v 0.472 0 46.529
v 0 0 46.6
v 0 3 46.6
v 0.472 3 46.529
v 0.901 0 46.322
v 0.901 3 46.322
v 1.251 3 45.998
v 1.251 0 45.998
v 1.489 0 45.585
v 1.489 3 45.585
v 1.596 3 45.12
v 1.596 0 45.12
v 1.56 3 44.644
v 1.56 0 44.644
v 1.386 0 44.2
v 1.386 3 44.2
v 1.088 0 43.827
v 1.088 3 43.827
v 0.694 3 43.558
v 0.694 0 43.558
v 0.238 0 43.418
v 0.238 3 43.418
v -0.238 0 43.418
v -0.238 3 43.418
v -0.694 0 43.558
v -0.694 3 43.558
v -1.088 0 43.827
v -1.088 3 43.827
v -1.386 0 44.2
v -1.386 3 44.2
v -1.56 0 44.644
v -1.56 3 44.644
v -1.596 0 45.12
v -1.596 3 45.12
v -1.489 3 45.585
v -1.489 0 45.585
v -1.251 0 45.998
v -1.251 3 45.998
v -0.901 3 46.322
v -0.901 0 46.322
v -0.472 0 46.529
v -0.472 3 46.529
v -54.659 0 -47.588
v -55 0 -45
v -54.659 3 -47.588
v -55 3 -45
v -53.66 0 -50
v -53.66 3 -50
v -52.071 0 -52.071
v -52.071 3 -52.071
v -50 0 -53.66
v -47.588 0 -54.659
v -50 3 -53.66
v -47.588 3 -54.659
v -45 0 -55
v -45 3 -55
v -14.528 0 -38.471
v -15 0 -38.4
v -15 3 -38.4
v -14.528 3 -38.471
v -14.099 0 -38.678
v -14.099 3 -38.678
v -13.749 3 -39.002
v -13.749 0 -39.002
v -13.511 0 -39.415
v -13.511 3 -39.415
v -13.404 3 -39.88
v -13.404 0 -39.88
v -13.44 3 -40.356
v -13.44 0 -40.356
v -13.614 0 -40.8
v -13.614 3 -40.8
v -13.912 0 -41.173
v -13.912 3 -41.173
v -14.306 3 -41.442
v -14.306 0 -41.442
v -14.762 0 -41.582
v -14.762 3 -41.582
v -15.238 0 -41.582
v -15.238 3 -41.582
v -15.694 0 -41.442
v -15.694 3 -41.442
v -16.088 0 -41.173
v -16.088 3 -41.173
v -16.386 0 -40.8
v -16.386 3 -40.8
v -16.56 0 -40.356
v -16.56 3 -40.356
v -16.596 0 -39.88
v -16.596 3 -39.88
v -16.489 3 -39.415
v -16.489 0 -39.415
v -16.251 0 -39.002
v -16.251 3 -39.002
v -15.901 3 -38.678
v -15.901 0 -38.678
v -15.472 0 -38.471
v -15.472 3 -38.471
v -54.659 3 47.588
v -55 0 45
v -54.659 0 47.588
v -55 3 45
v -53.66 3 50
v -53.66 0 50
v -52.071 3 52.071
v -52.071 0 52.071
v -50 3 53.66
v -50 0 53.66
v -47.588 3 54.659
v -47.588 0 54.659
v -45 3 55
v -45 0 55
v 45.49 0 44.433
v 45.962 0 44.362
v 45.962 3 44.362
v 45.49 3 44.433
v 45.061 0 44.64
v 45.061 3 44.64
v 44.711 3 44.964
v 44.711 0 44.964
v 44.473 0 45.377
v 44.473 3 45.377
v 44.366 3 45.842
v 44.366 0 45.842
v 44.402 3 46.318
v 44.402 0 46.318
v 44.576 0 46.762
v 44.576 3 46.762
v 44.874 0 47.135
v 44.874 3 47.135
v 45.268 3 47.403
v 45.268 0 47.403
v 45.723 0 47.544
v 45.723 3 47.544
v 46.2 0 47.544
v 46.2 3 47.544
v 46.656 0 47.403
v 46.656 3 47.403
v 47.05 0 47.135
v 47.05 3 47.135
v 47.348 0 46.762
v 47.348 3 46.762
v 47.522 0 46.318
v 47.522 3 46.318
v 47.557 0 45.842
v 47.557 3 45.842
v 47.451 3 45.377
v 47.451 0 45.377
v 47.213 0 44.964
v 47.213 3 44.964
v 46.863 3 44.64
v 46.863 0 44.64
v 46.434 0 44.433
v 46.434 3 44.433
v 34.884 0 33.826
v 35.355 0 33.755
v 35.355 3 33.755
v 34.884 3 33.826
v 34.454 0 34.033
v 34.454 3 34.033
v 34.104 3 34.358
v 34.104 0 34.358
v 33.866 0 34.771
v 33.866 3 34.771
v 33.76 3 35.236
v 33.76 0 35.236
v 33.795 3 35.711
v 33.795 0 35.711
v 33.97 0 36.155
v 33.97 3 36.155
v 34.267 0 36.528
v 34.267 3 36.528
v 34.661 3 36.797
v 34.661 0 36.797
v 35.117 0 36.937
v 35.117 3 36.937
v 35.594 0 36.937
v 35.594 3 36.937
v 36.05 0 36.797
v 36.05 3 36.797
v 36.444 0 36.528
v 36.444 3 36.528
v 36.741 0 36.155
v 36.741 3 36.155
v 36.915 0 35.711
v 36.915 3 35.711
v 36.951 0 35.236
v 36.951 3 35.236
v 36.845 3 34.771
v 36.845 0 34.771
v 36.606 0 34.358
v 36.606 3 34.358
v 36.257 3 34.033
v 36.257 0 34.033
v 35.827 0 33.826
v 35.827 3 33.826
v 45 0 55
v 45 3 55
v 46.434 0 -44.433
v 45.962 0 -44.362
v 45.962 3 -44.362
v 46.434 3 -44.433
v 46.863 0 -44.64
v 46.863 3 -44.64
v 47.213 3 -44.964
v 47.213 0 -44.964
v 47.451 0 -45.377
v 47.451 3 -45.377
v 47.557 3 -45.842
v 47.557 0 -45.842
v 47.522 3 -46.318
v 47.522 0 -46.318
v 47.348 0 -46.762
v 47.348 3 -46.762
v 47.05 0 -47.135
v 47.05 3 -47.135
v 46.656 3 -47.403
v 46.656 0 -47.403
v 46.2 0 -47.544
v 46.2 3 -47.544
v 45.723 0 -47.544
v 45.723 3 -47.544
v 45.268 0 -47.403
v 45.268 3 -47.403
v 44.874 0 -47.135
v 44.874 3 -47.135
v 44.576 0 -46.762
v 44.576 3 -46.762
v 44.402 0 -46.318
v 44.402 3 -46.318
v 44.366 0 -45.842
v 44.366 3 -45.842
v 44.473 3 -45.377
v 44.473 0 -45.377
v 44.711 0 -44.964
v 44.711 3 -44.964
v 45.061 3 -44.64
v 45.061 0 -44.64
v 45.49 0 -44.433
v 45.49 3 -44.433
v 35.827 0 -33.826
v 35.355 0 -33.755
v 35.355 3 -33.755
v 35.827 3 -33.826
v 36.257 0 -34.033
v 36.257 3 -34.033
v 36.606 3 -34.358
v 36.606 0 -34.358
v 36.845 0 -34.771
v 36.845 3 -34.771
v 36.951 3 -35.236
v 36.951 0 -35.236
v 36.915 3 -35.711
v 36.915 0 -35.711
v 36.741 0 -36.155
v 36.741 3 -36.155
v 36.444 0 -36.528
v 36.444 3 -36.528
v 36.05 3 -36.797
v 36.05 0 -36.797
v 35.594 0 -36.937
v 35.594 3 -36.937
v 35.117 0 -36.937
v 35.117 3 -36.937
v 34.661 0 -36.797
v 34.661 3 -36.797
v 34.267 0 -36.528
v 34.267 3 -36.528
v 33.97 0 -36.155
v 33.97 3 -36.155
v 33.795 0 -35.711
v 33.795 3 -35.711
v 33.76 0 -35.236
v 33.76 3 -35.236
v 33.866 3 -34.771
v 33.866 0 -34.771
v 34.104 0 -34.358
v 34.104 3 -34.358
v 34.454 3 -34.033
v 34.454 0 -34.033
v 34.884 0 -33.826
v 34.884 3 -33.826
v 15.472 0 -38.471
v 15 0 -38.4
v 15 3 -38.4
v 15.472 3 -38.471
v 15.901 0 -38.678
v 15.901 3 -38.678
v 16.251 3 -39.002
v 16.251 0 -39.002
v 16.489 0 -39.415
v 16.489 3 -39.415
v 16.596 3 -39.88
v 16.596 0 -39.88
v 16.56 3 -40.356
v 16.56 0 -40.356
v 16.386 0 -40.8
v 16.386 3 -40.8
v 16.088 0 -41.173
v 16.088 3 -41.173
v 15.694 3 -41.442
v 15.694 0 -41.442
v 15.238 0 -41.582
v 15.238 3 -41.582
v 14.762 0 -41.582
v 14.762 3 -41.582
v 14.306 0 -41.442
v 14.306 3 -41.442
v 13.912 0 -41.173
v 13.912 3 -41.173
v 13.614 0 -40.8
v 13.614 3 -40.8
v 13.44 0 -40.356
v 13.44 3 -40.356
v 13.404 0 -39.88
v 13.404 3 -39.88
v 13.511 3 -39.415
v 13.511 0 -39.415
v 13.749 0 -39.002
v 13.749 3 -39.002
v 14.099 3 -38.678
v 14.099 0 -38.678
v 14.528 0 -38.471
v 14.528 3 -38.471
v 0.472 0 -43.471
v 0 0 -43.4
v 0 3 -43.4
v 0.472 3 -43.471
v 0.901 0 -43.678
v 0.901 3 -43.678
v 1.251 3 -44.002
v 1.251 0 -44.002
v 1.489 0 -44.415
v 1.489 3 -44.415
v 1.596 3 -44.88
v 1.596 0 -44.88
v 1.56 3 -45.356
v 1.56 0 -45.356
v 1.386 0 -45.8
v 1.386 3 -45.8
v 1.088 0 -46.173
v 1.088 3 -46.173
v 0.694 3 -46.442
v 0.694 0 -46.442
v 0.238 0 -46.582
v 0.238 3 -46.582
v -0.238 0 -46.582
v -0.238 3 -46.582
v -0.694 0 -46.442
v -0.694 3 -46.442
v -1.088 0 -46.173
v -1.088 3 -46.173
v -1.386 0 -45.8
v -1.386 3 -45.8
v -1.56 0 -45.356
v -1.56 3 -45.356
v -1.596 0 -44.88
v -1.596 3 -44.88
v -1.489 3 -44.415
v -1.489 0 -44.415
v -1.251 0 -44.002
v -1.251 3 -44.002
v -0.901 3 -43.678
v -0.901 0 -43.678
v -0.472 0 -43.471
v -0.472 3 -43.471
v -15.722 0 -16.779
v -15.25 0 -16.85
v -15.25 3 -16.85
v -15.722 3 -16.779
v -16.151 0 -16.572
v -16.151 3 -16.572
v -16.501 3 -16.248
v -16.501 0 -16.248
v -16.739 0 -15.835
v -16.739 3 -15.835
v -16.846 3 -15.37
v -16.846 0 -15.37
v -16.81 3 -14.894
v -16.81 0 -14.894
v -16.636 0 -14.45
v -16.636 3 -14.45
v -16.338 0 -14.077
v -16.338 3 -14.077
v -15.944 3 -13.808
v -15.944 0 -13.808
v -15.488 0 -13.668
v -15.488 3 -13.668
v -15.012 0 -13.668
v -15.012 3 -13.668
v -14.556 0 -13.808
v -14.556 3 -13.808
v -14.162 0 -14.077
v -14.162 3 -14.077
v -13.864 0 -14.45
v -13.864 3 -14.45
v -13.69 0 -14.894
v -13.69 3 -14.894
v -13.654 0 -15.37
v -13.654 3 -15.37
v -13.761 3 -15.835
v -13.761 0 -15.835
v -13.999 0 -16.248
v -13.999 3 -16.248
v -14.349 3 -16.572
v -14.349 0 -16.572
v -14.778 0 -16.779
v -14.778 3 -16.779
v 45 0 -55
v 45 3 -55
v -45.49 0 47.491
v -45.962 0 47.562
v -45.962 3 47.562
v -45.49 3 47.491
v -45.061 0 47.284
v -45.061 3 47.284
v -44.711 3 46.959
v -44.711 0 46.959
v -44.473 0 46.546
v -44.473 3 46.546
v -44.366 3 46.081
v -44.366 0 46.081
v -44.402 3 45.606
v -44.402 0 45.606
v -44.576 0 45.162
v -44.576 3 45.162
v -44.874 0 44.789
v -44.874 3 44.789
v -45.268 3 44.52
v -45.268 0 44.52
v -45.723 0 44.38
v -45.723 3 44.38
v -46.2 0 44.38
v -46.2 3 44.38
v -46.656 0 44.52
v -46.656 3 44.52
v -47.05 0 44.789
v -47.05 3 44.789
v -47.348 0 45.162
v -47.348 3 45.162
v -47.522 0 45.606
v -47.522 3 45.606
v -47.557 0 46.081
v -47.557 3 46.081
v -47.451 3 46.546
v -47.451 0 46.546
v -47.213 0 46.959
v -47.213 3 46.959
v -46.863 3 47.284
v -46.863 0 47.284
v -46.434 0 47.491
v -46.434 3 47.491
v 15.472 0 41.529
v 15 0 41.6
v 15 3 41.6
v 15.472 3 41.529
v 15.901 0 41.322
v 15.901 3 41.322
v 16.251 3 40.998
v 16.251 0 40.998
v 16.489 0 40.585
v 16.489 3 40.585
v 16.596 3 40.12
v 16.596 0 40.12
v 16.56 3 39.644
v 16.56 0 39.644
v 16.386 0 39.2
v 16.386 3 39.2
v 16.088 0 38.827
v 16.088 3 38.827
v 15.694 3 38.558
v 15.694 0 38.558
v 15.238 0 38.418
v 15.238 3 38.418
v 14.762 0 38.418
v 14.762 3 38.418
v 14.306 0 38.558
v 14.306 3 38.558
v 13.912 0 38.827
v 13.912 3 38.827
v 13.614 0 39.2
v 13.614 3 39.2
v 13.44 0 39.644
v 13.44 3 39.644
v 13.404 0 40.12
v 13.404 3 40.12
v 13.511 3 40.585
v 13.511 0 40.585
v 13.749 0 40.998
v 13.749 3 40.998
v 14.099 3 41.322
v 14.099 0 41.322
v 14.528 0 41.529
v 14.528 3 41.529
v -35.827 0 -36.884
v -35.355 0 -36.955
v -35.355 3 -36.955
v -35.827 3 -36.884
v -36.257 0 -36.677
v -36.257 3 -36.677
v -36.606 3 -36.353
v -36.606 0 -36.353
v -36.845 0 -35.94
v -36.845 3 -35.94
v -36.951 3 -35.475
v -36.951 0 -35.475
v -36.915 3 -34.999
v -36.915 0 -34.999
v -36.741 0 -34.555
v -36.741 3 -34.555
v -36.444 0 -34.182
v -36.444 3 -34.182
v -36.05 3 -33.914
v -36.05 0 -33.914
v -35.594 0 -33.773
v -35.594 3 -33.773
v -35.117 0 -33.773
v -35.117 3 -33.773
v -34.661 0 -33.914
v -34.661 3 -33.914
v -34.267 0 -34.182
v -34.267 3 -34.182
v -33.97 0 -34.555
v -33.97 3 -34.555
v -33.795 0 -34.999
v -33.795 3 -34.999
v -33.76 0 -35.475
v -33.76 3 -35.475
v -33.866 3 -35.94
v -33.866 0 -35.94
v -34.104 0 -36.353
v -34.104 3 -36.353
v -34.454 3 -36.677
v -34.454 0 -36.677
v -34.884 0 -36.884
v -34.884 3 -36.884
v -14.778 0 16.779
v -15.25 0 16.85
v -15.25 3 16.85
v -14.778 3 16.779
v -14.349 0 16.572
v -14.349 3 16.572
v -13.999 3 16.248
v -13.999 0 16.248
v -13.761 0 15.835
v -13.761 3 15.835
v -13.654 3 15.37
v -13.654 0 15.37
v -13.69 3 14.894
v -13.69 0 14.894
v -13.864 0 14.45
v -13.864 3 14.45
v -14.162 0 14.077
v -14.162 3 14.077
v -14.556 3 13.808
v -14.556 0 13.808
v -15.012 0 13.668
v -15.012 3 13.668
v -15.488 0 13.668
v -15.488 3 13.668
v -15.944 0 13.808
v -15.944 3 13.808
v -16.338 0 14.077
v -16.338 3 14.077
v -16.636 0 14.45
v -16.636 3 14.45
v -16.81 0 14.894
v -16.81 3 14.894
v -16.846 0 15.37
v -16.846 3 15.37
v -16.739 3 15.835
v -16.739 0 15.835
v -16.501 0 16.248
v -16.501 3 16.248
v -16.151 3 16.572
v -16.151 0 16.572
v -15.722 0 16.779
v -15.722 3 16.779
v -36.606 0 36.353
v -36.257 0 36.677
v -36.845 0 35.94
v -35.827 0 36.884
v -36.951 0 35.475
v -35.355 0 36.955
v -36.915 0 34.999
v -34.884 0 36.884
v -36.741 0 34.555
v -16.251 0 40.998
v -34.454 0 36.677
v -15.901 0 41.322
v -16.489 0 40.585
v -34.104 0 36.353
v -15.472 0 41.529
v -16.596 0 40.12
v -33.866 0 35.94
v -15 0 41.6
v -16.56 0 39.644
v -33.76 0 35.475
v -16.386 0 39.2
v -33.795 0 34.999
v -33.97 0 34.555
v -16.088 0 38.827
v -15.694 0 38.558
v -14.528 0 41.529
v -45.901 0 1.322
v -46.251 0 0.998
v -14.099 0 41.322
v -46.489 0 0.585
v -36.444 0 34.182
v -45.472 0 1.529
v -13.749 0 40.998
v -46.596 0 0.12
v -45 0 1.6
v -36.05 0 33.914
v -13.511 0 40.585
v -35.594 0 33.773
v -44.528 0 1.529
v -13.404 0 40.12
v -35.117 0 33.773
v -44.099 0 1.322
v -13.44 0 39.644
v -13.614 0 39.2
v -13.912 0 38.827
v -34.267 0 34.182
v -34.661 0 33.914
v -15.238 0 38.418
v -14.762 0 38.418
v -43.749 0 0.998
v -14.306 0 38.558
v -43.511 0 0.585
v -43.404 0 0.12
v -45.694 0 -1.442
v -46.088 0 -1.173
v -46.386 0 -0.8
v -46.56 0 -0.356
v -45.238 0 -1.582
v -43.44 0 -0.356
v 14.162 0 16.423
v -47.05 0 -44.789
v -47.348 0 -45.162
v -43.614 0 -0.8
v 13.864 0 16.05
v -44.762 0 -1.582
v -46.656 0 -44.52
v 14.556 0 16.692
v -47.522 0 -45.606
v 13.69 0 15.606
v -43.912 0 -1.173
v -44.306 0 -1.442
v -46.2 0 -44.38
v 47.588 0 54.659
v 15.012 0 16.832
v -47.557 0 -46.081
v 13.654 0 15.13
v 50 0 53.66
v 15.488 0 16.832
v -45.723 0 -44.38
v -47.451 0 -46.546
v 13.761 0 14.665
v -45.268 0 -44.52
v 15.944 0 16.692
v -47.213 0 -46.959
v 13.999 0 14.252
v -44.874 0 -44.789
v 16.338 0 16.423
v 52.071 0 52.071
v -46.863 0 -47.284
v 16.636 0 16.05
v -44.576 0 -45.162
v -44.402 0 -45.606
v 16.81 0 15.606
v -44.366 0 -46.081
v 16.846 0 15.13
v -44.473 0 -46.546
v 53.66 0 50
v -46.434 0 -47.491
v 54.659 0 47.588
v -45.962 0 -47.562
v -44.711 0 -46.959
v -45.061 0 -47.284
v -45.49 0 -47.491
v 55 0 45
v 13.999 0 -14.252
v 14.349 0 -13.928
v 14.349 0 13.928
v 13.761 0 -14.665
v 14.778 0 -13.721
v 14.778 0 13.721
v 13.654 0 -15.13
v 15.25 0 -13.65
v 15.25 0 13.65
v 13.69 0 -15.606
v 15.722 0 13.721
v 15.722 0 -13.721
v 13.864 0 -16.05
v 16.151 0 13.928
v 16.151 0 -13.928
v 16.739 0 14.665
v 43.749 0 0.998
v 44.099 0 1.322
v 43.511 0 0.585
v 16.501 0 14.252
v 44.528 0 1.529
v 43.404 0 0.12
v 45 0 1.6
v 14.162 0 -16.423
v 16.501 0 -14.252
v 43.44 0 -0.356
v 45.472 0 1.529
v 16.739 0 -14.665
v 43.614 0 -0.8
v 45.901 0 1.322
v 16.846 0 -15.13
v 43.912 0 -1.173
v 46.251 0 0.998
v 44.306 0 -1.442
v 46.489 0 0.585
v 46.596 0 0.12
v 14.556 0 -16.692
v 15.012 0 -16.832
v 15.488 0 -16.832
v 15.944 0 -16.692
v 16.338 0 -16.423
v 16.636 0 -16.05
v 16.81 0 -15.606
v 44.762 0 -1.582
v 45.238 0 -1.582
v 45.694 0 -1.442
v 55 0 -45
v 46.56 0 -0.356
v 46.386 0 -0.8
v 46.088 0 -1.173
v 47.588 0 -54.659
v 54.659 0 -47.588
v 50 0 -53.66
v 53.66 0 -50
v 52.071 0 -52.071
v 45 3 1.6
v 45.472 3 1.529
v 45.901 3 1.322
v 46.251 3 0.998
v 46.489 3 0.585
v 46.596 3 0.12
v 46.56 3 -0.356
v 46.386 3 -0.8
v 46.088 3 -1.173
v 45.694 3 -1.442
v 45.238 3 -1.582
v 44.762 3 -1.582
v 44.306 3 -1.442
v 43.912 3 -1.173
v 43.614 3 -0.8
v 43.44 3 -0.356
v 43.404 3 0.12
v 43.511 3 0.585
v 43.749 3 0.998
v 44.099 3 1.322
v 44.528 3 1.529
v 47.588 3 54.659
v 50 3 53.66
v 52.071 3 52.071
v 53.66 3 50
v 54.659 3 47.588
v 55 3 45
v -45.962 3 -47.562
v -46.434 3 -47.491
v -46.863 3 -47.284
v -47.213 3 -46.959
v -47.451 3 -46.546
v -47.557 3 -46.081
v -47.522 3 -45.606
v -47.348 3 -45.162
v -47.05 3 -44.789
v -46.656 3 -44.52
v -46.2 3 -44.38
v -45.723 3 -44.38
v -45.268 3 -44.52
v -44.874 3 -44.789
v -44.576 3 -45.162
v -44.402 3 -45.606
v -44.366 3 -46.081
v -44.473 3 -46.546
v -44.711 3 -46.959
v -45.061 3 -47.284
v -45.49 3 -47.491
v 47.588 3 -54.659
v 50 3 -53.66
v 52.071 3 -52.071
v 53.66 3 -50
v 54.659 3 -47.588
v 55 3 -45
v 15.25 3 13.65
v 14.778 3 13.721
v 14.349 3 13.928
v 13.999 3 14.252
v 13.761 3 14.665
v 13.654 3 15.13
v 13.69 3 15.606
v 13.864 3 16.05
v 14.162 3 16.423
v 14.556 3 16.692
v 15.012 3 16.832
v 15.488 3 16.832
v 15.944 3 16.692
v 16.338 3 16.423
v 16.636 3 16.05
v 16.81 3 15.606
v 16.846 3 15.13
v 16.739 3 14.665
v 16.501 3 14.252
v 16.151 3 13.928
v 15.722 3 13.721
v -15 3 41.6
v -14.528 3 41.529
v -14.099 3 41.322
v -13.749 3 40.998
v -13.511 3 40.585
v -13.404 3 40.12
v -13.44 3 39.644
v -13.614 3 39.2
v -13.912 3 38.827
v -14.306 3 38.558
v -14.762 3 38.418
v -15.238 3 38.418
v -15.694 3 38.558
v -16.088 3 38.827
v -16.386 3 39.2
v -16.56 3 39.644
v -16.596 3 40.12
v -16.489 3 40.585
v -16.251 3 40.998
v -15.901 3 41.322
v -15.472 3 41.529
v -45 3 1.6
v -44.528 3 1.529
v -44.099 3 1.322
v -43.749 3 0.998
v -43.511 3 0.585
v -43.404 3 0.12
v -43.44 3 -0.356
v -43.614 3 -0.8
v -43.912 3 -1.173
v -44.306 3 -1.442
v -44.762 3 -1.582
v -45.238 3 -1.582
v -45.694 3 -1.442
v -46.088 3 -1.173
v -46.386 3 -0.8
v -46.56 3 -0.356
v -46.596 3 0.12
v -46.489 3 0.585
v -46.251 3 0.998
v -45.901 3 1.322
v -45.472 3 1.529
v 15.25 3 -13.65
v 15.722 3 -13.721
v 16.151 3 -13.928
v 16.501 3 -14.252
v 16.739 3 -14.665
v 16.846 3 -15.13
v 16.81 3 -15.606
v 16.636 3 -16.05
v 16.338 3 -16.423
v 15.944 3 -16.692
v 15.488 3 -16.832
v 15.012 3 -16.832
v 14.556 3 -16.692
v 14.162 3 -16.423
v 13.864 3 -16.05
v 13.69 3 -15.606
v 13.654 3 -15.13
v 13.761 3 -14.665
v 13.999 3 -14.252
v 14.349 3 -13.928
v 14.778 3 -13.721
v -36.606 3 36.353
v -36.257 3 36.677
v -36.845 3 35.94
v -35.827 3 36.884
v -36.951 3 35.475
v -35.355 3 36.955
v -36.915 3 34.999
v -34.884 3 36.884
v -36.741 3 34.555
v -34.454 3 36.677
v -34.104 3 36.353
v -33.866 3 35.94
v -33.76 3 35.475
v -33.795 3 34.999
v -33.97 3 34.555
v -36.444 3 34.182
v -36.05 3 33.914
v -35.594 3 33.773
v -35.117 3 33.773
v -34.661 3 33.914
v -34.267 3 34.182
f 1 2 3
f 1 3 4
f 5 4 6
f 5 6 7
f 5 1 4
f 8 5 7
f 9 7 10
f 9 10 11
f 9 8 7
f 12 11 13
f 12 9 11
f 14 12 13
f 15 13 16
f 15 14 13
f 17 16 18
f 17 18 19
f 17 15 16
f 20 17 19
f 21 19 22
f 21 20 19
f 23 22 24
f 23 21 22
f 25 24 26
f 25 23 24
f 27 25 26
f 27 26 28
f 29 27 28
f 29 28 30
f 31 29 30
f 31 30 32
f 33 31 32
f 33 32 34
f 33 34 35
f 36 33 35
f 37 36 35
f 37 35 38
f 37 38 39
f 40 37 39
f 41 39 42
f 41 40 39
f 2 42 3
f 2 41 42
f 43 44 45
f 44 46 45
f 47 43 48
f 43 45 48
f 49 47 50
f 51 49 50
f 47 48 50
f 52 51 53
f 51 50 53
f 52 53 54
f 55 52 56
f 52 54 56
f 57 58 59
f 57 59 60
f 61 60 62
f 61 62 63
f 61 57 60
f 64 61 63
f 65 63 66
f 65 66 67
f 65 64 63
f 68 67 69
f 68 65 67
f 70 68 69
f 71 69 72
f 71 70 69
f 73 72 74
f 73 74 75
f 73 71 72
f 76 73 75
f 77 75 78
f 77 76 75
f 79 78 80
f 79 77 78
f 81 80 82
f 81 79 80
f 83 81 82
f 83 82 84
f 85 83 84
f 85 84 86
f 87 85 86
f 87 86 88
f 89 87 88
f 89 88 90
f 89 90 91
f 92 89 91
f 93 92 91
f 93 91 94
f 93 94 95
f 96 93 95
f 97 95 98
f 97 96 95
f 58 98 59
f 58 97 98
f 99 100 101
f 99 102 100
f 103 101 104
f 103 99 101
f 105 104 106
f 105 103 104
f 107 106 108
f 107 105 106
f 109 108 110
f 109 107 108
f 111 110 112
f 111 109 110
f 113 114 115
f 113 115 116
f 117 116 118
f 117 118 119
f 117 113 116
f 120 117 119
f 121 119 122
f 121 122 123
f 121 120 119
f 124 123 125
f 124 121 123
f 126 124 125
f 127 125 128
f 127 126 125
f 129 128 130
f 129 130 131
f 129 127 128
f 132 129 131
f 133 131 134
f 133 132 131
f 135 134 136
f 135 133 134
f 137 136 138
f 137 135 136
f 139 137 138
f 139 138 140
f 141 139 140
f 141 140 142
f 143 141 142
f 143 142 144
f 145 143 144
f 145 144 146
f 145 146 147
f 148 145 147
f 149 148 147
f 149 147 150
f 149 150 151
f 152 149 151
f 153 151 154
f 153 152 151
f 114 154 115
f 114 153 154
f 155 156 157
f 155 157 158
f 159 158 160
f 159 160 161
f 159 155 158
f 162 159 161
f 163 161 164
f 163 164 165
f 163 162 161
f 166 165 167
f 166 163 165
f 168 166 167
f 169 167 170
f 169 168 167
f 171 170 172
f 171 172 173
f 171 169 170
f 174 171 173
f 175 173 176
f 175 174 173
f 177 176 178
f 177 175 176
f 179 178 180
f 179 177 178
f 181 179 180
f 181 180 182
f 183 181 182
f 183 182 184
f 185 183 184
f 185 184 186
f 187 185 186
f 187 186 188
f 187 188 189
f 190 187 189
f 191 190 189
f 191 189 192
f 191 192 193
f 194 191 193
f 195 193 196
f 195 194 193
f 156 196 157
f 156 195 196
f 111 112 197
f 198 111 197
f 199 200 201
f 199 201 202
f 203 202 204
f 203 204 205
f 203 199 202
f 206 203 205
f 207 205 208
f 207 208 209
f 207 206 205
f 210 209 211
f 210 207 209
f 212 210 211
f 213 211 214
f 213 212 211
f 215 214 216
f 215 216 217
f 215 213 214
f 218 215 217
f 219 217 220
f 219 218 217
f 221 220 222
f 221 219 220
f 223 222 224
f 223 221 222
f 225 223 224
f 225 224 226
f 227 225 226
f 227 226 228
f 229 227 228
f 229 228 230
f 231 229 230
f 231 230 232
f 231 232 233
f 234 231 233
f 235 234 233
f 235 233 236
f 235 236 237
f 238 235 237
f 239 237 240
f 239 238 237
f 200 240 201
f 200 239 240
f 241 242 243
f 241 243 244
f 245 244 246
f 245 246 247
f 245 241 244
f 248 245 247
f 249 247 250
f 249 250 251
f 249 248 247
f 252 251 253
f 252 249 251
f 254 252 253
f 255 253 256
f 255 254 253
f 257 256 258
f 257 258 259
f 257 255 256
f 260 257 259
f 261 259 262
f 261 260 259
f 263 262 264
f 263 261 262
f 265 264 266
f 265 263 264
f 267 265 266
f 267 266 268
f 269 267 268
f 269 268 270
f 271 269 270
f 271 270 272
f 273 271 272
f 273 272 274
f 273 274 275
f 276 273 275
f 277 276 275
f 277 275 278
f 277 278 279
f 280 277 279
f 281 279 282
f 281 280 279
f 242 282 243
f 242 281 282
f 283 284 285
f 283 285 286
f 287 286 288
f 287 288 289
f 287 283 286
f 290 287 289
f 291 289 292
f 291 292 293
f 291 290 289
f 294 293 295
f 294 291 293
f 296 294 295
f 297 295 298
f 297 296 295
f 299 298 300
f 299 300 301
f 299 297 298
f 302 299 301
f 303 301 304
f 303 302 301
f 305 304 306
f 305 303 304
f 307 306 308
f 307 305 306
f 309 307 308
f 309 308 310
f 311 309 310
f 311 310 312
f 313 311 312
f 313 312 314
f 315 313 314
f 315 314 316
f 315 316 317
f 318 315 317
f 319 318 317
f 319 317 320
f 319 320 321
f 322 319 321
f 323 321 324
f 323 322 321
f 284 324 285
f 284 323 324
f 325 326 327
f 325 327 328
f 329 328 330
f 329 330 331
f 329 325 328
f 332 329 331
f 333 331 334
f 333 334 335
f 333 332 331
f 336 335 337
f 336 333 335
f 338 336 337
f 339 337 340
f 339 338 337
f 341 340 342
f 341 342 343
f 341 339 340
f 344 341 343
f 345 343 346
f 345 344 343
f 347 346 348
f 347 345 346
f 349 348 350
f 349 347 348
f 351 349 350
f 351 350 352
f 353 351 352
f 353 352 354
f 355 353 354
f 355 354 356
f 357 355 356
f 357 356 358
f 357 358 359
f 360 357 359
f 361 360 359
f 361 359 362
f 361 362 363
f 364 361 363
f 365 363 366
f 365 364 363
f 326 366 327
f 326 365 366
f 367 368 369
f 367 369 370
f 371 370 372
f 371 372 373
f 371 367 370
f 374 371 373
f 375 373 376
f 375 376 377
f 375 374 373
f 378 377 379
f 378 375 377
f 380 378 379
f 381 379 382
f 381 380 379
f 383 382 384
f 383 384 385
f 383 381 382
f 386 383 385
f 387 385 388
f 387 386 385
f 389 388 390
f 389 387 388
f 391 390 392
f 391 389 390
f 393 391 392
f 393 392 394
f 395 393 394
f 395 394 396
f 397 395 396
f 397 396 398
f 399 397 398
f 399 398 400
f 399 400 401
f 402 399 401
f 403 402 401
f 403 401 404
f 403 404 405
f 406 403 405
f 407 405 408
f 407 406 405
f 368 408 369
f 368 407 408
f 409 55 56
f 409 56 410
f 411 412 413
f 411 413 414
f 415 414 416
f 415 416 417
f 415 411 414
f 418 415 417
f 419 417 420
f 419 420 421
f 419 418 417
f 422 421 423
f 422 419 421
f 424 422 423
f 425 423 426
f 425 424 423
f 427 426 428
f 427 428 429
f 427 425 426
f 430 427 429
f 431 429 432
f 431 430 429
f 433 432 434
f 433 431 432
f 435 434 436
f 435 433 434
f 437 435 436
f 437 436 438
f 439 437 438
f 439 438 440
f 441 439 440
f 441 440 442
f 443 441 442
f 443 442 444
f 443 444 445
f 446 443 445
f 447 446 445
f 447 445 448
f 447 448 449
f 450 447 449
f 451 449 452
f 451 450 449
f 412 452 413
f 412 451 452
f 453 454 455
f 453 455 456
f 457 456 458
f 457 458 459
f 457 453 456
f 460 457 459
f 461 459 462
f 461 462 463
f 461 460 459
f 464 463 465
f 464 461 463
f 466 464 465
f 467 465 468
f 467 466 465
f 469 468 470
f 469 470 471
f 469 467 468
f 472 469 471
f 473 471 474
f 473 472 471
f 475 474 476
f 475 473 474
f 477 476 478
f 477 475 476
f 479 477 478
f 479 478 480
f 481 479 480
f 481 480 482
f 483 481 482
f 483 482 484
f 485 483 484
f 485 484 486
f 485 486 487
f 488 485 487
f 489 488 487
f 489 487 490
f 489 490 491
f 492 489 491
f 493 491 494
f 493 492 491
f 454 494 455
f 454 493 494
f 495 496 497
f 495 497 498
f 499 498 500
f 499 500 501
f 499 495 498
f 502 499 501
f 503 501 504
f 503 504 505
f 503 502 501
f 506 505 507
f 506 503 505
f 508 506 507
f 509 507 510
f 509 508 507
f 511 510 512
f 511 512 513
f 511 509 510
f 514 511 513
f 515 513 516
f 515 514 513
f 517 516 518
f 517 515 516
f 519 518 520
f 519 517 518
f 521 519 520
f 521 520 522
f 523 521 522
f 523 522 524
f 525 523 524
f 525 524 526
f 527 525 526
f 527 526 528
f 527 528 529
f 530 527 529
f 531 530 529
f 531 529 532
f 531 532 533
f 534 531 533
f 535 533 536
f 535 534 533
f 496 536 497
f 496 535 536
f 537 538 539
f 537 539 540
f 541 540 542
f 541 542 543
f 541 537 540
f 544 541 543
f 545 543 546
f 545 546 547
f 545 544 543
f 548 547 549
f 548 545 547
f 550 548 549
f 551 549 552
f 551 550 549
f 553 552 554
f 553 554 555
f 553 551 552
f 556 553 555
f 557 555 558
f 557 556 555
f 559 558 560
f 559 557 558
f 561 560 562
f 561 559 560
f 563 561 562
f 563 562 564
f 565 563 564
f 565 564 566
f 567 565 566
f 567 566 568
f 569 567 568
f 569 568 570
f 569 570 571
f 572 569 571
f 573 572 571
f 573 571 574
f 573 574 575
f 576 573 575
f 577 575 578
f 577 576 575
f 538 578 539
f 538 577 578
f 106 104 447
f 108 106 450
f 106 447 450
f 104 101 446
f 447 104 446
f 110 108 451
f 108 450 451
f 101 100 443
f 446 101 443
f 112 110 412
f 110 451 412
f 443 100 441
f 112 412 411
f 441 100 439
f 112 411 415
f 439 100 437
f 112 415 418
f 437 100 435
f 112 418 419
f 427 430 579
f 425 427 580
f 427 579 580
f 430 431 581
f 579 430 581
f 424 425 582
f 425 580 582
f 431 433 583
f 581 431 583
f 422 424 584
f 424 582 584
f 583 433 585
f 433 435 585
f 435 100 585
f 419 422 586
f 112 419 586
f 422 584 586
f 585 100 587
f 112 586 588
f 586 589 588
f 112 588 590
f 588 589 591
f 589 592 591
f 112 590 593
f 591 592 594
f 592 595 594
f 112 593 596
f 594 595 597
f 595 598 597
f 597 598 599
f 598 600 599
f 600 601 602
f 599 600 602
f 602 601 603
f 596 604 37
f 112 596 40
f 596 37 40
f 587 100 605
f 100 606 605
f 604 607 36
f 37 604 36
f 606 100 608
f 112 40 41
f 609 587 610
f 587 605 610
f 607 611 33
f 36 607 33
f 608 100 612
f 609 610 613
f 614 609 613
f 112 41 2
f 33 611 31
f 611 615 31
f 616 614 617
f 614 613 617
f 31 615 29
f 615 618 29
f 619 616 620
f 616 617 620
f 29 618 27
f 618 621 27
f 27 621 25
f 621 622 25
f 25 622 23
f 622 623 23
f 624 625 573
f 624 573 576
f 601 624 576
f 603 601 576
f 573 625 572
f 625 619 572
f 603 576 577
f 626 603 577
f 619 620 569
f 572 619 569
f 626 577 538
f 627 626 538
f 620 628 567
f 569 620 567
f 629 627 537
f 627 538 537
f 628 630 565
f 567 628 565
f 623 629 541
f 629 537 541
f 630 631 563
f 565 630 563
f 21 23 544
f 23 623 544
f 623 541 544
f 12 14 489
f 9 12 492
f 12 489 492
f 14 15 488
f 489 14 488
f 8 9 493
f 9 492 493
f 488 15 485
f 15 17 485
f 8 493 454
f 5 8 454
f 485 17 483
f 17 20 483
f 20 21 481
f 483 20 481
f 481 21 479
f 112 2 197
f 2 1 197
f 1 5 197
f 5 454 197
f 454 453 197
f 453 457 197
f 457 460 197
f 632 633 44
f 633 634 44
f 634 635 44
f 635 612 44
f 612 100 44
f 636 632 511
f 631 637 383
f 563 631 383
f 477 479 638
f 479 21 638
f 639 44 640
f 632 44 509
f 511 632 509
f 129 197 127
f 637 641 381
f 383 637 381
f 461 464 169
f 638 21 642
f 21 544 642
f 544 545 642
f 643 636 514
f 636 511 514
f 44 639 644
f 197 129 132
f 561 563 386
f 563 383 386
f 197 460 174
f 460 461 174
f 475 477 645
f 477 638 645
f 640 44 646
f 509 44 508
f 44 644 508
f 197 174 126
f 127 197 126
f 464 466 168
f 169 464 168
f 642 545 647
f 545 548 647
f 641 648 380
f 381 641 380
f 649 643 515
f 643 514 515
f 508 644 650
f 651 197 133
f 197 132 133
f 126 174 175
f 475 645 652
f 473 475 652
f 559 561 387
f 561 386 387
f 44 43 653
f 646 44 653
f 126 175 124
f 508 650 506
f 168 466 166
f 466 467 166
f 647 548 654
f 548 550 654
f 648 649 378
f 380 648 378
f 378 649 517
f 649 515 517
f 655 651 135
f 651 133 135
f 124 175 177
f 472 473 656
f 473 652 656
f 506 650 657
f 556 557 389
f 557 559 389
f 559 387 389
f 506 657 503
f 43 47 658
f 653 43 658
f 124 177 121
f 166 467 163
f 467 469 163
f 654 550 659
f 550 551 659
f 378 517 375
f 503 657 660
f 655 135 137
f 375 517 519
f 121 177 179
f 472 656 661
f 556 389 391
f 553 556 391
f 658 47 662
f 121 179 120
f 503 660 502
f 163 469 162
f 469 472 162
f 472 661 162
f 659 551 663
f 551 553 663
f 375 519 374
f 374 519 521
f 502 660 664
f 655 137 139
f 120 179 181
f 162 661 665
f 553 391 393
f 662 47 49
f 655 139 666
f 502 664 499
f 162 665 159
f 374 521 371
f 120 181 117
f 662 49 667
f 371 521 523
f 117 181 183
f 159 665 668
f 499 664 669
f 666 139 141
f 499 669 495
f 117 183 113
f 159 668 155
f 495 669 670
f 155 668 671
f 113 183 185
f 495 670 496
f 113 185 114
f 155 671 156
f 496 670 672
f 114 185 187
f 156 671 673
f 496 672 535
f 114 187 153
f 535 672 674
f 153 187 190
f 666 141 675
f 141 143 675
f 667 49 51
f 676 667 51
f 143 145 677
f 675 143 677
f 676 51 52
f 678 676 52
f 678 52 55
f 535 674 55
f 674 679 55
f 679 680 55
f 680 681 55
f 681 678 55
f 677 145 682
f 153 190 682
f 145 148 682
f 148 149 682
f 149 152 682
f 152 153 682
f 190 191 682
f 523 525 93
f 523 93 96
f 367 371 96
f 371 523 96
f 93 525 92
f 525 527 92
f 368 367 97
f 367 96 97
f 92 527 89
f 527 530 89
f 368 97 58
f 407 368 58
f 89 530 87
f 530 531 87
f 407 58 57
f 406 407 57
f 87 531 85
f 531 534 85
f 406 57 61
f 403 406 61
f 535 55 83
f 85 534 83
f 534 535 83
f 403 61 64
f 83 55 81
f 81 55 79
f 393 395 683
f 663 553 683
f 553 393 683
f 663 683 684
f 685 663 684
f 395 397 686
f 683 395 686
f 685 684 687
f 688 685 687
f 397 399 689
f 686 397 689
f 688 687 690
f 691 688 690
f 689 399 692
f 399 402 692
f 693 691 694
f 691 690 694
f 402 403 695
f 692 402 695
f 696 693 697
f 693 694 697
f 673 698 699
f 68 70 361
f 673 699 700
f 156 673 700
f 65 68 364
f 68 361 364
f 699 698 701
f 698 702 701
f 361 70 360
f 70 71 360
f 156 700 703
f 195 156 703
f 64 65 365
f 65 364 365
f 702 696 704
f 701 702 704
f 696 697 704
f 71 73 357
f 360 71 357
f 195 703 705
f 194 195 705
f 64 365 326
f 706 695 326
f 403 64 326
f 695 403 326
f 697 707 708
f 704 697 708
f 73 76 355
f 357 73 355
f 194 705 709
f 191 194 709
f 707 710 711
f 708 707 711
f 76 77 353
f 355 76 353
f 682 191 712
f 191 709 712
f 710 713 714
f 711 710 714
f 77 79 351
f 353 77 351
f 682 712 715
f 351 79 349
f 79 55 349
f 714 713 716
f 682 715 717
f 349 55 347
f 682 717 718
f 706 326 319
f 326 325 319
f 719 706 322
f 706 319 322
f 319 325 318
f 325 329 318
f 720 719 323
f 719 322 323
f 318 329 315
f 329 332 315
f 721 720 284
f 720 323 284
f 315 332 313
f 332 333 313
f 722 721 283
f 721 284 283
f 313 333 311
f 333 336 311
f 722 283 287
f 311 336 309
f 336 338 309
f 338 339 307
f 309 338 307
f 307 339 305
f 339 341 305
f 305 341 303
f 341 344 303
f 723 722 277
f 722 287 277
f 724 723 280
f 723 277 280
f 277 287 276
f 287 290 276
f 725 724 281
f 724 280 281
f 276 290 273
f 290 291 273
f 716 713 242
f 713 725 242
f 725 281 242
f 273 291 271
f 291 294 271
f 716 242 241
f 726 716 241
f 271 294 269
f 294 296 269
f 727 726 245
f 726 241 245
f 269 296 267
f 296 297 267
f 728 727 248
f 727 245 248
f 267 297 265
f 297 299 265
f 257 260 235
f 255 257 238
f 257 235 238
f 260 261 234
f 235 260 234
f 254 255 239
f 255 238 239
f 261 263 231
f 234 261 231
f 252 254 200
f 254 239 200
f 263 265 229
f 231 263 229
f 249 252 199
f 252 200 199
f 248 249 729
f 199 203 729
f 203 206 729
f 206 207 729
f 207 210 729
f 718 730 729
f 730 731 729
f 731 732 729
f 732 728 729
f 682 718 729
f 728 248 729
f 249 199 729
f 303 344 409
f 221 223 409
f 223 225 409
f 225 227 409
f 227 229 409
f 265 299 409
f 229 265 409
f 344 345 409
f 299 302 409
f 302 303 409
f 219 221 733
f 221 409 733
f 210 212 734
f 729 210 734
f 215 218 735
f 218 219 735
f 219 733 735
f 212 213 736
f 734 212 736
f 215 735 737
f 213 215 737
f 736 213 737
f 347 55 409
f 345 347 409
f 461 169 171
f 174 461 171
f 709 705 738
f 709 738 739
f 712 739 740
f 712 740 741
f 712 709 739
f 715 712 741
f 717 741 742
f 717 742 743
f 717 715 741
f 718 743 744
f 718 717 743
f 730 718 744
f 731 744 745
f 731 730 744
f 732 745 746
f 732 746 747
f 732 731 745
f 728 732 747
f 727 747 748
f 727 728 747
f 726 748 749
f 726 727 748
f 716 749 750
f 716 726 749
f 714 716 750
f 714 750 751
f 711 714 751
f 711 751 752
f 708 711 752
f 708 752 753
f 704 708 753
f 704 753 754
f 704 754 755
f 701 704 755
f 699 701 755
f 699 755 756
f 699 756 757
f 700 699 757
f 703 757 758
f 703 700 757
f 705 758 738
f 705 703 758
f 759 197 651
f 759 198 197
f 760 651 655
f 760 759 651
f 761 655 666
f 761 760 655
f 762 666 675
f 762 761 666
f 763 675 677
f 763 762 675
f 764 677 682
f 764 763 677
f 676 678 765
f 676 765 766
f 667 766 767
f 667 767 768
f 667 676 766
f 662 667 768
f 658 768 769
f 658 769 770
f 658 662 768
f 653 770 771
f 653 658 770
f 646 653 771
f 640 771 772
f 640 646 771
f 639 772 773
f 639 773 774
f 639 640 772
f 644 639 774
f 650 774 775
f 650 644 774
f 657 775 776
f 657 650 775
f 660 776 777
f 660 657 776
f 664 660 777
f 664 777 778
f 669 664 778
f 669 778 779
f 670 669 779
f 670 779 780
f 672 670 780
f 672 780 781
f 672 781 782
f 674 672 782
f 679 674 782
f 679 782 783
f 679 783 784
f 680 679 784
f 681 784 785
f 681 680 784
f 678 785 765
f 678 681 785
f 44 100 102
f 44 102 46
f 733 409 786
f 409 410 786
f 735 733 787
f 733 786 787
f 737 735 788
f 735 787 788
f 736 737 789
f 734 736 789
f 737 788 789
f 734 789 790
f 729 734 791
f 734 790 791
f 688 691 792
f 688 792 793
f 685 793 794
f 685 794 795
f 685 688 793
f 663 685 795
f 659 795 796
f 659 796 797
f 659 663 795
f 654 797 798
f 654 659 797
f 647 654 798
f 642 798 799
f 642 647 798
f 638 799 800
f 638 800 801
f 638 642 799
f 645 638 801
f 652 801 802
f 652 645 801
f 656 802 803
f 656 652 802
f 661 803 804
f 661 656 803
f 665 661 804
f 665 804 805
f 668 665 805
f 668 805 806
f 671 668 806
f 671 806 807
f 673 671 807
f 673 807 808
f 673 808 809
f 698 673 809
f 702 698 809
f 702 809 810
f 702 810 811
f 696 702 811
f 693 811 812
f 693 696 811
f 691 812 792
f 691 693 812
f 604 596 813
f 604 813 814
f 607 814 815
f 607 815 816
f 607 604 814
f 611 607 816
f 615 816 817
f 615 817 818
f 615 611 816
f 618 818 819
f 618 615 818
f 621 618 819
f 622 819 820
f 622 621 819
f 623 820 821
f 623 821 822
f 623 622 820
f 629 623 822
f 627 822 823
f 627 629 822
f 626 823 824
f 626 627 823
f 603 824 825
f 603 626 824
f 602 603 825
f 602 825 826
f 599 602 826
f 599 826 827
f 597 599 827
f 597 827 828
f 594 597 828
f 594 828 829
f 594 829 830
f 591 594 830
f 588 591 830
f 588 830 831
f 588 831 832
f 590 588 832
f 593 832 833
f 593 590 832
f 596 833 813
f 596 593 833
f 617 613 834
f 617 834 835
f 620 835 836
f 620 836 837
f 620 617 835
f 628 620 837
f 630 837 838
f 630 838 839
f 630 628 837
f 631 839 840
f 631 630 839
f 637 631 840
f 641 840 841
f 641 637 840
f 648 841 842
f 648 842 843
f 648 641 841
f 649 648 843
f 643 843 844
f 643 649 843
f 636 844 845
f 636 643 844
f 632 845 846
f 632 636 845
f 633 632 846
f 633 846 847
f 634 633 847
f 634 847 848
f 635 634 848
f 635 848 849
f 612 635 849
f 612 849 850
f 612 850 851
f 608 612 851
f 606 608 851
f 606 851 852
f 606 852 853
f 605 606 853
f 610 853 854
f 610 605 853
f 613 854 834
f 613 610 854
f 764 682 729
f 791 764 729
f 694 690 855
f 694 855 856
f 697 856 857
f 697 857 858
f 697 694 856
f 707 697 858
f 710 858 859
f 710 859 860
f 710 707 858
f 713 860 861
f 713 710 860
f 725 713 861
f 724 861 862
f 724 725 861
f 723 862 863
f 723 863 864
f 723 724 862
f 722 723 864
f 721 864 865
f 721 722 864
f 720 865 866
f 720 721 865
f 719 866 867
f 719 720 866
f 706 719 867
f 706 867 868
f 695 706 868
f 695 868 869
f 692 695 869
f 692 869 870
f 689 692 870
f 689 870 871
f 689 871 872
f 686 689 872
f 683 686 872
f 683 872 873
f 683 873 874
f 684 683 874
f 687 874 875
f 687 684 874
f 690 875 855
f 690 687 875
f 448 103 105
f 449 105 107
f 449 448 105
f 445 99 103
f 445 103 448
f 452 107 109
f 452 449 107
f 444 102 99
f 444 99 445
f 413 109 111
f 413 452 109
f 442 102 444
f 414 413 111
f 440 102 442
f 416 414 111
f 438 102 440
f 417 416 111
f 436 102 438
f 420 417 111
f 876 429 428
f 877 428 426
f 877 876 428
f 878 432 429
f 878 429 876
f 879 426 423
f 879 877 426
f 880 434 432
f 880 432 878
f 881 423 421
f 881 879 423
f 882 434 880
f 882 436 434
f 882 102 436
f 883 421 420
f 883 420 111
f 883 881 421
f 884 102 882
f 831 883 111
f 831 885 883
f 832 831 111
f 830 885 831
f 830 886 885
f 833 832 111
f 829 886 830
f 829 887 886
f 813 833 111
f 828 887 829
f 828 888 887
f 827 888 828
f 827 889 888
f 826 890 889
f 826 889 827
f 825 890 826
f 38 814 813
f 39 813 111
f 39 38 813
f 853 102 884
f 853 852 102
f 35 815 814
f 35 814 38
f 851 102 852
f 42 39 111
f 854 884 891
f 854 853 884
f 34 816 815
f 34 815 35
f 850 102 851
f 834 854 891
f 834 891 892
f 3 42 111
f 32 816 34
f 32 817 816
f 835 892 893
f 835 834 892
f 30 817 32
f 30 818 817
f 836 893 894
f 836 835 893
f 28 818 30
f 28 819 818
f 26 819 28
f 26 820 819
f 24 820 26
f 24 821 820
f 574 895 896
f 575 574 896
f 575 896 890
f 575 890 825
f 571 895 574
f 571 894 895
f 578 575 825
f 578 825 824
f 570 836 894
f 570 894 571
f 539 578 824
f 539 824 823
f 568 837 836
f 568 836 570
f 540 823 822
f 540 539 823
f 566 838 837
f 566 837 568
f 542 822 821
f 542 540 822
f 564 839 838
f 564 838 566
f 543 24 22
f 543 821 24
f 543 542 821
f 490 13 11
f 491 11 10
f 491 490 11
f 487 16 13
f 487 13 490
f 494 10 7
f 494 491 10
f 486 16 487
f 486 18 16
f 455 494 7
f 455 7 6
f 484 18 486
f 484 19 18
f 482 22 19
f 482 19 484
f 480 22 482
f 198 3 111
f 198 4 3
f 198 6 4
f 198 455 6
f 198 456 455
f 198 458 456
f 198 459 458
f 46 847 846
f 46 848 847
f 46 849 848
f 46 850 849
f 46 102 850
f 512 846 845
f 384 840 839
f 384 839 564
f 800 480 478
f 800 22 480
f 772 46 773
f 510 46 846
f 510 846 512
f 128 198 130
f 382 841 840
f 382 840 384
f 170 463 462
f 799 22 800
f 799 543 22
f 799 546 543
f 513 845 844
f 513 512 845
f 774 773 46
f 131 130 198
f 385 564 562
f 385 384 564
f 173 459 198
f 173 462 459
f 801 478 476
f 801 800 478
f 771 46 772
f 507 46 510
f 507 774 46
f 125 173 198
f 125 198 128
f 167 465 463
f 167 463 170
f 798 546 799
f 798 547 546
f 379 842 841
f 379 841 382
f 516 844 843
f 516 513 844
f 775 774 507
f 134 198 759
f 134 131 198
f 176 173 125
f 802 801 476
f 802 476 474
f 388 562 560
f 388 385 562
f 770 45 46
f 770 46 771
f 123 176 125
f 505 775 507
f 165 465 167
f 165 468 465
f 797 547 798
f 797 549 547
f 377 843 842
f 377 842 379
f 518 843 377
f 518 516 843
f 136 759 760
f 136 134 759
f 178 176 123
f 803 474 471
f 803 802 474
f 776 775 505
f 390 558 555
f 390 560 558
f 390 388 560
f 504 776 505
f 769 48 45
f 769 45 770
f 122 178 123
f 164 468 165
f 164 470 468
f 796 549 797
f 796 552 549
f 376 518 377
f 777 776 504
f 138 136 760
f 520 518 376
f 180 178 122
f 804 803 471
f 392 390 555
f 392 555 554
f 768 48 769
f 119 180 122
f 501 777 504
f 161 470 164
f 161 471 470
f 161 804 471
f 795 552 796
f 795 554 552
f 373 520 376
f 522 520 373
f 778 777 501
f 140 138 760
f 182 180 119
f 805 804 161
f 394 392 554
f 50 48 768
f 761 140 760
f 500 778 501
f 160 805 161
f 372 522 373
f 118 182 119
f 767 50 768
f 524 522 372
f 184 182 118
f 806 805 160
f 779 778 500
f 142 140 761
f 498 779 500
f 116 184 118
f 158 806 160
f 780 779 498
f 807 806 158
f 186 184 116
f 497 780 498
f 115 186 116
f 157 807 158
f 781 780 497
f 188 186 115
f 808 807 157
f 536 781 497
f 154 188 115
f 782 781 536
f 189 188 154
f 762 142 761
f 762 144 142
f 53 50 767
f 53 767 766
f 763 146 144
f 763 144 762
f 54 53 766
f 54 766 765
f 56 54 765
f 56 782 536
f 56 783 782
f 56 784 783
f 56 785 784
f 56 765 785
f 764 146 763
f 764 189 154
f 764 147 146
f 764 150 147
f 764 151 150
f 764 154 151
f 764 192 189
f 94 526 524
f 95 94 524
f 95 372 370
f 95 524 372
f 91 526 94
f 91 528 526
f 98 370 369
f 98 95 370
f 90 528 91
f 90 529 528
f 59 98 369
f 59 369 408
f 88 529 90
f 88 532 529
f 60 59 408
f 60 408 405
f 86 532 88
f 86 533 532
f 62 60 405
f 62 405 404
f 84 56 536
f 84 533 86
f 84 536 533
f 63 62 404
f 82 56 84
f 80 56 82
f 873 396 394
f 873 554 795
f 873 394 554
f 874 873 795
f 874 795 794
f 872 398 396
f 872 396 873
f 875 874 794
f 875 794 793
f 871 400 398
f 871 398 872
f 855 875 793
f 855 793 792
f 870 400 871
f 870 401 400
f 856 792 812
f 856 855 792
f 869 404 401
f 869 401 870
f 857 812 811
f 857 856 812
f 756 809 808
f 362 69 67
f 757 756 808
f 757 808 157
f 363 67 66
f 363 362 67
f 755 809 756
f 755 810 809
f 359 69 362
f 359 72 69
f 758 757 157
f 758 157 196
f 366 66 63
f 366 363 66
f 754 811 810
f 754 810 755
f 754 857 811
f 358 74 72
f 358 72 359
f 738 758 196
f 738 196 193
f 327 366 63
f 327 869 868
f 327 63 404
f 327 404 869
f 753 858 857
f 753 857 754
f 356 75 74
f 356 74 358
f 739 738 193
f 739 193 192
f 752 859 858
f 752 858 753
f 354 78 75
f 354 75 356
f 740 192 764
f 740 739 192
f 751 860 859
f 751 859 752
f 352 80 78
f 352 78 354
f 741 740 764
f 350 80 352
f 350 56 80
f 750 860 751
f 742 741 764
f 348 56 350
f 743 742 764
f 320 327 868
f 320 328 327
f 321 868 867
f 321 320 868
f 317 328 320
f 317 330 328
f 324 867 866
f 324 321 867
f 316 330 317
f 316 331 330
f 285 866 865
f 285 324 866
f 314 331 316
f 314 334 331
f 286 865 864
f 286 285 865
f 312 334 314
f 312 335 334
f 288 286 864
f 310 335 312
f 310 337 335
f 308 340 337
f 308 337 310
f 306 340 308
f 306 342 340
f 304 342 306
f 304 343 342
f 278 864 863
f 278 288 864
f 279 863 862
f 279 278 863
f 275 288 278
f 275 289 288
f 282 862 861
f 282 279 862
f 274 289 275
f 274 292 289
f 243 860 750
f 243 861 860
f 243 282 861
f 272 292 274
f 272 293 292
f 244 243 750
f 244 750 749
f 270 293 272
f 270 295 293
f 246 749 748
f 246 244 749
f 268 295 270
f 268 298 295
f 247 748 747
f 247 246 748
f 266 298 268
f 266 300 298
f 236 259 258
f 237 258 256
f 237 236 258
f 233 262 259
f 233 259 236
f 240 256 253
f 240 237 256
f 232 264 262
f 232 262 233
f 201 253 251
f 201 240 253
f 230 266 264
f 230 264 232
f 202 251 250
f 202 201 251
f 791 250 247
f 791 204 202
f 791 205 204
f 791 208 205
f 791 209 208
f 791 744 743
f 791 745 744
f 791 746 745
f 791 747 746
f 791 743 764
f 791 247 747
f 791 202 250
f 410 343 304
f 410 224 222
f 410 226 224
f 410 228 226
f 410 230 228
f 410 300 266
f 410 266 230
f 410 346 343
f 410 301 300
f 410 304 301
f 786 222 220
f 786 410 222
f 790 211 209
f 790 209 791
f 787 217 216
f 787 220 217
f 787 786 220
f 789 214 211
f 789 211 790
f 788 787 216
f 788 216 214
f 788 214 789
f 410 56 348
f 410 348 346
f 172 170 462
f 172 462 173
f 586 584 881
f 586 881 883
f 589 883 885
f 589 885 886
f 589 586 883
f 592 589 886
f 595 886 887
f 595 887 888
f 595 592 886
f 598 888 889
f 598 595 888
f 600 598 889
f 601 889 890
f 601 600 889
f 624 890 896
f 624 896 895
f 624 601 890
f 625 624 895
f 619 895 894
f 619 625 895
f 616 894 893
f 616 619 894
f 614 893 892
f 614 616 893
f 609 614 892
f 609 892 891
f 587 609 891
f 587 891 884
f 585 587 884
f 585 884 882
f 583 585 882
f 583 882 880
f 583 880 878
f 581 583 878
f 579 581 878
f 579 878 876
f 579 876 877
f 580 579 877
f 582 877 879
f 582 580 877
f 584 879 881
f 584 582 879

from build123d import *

# Parameters (mm, degrees)
SKETCH2_W           = 110
SKETCH2_H           = 110
SKETCH2_R           = 1.6
BOSS_EXTRUDE1_DEPTH = 3
FILLET1_R           = 10


with BuildPart() as part:
    # Sketch2 → Boss-Extrude1 (new body)
    with BuildSketch(Plane(origin=(0, 0, 0), x_dir=(1, 0, 0), z_dir=(0, 1, 0))):
        Rectangle(SKETCH2_W, SKETCH2_H)
        with Locations((15.25, 15.25)):
            Circle(SKETCH2_R, mode=Mode.SUBTRACT)
        with Locations((-15.25, 15.25)):
            Circle(SKETCH2_R, mode=Mode.SUBTRACT)
        with Locations((-15.25, -15.25)):
            Circle(SKETCH2_R, mode=Mode.SUBTRACT)
        with Locations((15.25, -15.25)):
            Circle(SKETCH2_R, mode=Mode.SUBTRACT)
        with Locations((35.3553, 35.3553)):
            Circle(SKETCH2_R, mode=Mode.SUBTRACT)
        with Locations((45.9619, 45.9619)):
            Circle(SKETCH2_R, mode=Mode.SUBTRACT)
        with Locations((-35.3553, 35.3553)):
            Circle(SKETCH2_R, mode=Mode.SUBTRACT)
        with Locations((-45.9619, 45.9619)):
            Circle(SKETCH2_R, mode=Mode.SUBTRACT)
        with Locations((45.9619, -45.9619)):
            Circle(SKETCH2_R, mode=Mode.SUBTRACT)
        with Locations((35.3553, -35.3553)):
            Circle(SKETCH2_R, mode=Mode.SUBTRACT)
        with Locations((-45.9619, -45.9619)):
            Circle(SKETCH2_R, mode=Mode.SUBTRACT)
        with Locations((-35.3553, -35.3553)):
            Circle(SKETCH2_R, mode=Mode.SUBTRACT)
        with Locations((0, 45)):
            Circle(SKETCH2_R, mode=Mode.SUBTRACT)
        with Locations((-45, 0)):
            Circle(SKETCH2_R, mode=Mode.SUBTRACT)
        with Locations((45, 0)):
            Circle(SKETCH2_R, mode=Mode.SUBTRACT)
        with Locations((0, -45)):
            Circle(SKETCH2_R, mode=Mode.SUBTRACT)
        with Locations((-15, -40)):
            Circle(SKETCH2_R, mode=Mode.SUBTRACT)
        with Locations((15, -40)):
            Circle(SKETCH2_R, mode=Mode.SUBTRACT)
        with Locations((-15, 40)):
            Circle(SKETCH2_R, mode=Mode.SUBTRACT)
        with Locations((15, 40)):
            Circle(SKETCH2_R, mode=Mode.SUBTRACT)
    extrude(amount=BOSS_EXTRUDE1_DEPTH)

    # Fillet1
    fillet1_edges = [part.edges().sort_by_distance(p)[0] for p in [
        (55, 1.5, 55),
        (55, 1.5, -55),
        (-55, 1.5, 55),
        (-55, 1.5, -55),
    ]]
    fillet(fillet1_edges, radius=FILLET1_R)


solid = part.part
